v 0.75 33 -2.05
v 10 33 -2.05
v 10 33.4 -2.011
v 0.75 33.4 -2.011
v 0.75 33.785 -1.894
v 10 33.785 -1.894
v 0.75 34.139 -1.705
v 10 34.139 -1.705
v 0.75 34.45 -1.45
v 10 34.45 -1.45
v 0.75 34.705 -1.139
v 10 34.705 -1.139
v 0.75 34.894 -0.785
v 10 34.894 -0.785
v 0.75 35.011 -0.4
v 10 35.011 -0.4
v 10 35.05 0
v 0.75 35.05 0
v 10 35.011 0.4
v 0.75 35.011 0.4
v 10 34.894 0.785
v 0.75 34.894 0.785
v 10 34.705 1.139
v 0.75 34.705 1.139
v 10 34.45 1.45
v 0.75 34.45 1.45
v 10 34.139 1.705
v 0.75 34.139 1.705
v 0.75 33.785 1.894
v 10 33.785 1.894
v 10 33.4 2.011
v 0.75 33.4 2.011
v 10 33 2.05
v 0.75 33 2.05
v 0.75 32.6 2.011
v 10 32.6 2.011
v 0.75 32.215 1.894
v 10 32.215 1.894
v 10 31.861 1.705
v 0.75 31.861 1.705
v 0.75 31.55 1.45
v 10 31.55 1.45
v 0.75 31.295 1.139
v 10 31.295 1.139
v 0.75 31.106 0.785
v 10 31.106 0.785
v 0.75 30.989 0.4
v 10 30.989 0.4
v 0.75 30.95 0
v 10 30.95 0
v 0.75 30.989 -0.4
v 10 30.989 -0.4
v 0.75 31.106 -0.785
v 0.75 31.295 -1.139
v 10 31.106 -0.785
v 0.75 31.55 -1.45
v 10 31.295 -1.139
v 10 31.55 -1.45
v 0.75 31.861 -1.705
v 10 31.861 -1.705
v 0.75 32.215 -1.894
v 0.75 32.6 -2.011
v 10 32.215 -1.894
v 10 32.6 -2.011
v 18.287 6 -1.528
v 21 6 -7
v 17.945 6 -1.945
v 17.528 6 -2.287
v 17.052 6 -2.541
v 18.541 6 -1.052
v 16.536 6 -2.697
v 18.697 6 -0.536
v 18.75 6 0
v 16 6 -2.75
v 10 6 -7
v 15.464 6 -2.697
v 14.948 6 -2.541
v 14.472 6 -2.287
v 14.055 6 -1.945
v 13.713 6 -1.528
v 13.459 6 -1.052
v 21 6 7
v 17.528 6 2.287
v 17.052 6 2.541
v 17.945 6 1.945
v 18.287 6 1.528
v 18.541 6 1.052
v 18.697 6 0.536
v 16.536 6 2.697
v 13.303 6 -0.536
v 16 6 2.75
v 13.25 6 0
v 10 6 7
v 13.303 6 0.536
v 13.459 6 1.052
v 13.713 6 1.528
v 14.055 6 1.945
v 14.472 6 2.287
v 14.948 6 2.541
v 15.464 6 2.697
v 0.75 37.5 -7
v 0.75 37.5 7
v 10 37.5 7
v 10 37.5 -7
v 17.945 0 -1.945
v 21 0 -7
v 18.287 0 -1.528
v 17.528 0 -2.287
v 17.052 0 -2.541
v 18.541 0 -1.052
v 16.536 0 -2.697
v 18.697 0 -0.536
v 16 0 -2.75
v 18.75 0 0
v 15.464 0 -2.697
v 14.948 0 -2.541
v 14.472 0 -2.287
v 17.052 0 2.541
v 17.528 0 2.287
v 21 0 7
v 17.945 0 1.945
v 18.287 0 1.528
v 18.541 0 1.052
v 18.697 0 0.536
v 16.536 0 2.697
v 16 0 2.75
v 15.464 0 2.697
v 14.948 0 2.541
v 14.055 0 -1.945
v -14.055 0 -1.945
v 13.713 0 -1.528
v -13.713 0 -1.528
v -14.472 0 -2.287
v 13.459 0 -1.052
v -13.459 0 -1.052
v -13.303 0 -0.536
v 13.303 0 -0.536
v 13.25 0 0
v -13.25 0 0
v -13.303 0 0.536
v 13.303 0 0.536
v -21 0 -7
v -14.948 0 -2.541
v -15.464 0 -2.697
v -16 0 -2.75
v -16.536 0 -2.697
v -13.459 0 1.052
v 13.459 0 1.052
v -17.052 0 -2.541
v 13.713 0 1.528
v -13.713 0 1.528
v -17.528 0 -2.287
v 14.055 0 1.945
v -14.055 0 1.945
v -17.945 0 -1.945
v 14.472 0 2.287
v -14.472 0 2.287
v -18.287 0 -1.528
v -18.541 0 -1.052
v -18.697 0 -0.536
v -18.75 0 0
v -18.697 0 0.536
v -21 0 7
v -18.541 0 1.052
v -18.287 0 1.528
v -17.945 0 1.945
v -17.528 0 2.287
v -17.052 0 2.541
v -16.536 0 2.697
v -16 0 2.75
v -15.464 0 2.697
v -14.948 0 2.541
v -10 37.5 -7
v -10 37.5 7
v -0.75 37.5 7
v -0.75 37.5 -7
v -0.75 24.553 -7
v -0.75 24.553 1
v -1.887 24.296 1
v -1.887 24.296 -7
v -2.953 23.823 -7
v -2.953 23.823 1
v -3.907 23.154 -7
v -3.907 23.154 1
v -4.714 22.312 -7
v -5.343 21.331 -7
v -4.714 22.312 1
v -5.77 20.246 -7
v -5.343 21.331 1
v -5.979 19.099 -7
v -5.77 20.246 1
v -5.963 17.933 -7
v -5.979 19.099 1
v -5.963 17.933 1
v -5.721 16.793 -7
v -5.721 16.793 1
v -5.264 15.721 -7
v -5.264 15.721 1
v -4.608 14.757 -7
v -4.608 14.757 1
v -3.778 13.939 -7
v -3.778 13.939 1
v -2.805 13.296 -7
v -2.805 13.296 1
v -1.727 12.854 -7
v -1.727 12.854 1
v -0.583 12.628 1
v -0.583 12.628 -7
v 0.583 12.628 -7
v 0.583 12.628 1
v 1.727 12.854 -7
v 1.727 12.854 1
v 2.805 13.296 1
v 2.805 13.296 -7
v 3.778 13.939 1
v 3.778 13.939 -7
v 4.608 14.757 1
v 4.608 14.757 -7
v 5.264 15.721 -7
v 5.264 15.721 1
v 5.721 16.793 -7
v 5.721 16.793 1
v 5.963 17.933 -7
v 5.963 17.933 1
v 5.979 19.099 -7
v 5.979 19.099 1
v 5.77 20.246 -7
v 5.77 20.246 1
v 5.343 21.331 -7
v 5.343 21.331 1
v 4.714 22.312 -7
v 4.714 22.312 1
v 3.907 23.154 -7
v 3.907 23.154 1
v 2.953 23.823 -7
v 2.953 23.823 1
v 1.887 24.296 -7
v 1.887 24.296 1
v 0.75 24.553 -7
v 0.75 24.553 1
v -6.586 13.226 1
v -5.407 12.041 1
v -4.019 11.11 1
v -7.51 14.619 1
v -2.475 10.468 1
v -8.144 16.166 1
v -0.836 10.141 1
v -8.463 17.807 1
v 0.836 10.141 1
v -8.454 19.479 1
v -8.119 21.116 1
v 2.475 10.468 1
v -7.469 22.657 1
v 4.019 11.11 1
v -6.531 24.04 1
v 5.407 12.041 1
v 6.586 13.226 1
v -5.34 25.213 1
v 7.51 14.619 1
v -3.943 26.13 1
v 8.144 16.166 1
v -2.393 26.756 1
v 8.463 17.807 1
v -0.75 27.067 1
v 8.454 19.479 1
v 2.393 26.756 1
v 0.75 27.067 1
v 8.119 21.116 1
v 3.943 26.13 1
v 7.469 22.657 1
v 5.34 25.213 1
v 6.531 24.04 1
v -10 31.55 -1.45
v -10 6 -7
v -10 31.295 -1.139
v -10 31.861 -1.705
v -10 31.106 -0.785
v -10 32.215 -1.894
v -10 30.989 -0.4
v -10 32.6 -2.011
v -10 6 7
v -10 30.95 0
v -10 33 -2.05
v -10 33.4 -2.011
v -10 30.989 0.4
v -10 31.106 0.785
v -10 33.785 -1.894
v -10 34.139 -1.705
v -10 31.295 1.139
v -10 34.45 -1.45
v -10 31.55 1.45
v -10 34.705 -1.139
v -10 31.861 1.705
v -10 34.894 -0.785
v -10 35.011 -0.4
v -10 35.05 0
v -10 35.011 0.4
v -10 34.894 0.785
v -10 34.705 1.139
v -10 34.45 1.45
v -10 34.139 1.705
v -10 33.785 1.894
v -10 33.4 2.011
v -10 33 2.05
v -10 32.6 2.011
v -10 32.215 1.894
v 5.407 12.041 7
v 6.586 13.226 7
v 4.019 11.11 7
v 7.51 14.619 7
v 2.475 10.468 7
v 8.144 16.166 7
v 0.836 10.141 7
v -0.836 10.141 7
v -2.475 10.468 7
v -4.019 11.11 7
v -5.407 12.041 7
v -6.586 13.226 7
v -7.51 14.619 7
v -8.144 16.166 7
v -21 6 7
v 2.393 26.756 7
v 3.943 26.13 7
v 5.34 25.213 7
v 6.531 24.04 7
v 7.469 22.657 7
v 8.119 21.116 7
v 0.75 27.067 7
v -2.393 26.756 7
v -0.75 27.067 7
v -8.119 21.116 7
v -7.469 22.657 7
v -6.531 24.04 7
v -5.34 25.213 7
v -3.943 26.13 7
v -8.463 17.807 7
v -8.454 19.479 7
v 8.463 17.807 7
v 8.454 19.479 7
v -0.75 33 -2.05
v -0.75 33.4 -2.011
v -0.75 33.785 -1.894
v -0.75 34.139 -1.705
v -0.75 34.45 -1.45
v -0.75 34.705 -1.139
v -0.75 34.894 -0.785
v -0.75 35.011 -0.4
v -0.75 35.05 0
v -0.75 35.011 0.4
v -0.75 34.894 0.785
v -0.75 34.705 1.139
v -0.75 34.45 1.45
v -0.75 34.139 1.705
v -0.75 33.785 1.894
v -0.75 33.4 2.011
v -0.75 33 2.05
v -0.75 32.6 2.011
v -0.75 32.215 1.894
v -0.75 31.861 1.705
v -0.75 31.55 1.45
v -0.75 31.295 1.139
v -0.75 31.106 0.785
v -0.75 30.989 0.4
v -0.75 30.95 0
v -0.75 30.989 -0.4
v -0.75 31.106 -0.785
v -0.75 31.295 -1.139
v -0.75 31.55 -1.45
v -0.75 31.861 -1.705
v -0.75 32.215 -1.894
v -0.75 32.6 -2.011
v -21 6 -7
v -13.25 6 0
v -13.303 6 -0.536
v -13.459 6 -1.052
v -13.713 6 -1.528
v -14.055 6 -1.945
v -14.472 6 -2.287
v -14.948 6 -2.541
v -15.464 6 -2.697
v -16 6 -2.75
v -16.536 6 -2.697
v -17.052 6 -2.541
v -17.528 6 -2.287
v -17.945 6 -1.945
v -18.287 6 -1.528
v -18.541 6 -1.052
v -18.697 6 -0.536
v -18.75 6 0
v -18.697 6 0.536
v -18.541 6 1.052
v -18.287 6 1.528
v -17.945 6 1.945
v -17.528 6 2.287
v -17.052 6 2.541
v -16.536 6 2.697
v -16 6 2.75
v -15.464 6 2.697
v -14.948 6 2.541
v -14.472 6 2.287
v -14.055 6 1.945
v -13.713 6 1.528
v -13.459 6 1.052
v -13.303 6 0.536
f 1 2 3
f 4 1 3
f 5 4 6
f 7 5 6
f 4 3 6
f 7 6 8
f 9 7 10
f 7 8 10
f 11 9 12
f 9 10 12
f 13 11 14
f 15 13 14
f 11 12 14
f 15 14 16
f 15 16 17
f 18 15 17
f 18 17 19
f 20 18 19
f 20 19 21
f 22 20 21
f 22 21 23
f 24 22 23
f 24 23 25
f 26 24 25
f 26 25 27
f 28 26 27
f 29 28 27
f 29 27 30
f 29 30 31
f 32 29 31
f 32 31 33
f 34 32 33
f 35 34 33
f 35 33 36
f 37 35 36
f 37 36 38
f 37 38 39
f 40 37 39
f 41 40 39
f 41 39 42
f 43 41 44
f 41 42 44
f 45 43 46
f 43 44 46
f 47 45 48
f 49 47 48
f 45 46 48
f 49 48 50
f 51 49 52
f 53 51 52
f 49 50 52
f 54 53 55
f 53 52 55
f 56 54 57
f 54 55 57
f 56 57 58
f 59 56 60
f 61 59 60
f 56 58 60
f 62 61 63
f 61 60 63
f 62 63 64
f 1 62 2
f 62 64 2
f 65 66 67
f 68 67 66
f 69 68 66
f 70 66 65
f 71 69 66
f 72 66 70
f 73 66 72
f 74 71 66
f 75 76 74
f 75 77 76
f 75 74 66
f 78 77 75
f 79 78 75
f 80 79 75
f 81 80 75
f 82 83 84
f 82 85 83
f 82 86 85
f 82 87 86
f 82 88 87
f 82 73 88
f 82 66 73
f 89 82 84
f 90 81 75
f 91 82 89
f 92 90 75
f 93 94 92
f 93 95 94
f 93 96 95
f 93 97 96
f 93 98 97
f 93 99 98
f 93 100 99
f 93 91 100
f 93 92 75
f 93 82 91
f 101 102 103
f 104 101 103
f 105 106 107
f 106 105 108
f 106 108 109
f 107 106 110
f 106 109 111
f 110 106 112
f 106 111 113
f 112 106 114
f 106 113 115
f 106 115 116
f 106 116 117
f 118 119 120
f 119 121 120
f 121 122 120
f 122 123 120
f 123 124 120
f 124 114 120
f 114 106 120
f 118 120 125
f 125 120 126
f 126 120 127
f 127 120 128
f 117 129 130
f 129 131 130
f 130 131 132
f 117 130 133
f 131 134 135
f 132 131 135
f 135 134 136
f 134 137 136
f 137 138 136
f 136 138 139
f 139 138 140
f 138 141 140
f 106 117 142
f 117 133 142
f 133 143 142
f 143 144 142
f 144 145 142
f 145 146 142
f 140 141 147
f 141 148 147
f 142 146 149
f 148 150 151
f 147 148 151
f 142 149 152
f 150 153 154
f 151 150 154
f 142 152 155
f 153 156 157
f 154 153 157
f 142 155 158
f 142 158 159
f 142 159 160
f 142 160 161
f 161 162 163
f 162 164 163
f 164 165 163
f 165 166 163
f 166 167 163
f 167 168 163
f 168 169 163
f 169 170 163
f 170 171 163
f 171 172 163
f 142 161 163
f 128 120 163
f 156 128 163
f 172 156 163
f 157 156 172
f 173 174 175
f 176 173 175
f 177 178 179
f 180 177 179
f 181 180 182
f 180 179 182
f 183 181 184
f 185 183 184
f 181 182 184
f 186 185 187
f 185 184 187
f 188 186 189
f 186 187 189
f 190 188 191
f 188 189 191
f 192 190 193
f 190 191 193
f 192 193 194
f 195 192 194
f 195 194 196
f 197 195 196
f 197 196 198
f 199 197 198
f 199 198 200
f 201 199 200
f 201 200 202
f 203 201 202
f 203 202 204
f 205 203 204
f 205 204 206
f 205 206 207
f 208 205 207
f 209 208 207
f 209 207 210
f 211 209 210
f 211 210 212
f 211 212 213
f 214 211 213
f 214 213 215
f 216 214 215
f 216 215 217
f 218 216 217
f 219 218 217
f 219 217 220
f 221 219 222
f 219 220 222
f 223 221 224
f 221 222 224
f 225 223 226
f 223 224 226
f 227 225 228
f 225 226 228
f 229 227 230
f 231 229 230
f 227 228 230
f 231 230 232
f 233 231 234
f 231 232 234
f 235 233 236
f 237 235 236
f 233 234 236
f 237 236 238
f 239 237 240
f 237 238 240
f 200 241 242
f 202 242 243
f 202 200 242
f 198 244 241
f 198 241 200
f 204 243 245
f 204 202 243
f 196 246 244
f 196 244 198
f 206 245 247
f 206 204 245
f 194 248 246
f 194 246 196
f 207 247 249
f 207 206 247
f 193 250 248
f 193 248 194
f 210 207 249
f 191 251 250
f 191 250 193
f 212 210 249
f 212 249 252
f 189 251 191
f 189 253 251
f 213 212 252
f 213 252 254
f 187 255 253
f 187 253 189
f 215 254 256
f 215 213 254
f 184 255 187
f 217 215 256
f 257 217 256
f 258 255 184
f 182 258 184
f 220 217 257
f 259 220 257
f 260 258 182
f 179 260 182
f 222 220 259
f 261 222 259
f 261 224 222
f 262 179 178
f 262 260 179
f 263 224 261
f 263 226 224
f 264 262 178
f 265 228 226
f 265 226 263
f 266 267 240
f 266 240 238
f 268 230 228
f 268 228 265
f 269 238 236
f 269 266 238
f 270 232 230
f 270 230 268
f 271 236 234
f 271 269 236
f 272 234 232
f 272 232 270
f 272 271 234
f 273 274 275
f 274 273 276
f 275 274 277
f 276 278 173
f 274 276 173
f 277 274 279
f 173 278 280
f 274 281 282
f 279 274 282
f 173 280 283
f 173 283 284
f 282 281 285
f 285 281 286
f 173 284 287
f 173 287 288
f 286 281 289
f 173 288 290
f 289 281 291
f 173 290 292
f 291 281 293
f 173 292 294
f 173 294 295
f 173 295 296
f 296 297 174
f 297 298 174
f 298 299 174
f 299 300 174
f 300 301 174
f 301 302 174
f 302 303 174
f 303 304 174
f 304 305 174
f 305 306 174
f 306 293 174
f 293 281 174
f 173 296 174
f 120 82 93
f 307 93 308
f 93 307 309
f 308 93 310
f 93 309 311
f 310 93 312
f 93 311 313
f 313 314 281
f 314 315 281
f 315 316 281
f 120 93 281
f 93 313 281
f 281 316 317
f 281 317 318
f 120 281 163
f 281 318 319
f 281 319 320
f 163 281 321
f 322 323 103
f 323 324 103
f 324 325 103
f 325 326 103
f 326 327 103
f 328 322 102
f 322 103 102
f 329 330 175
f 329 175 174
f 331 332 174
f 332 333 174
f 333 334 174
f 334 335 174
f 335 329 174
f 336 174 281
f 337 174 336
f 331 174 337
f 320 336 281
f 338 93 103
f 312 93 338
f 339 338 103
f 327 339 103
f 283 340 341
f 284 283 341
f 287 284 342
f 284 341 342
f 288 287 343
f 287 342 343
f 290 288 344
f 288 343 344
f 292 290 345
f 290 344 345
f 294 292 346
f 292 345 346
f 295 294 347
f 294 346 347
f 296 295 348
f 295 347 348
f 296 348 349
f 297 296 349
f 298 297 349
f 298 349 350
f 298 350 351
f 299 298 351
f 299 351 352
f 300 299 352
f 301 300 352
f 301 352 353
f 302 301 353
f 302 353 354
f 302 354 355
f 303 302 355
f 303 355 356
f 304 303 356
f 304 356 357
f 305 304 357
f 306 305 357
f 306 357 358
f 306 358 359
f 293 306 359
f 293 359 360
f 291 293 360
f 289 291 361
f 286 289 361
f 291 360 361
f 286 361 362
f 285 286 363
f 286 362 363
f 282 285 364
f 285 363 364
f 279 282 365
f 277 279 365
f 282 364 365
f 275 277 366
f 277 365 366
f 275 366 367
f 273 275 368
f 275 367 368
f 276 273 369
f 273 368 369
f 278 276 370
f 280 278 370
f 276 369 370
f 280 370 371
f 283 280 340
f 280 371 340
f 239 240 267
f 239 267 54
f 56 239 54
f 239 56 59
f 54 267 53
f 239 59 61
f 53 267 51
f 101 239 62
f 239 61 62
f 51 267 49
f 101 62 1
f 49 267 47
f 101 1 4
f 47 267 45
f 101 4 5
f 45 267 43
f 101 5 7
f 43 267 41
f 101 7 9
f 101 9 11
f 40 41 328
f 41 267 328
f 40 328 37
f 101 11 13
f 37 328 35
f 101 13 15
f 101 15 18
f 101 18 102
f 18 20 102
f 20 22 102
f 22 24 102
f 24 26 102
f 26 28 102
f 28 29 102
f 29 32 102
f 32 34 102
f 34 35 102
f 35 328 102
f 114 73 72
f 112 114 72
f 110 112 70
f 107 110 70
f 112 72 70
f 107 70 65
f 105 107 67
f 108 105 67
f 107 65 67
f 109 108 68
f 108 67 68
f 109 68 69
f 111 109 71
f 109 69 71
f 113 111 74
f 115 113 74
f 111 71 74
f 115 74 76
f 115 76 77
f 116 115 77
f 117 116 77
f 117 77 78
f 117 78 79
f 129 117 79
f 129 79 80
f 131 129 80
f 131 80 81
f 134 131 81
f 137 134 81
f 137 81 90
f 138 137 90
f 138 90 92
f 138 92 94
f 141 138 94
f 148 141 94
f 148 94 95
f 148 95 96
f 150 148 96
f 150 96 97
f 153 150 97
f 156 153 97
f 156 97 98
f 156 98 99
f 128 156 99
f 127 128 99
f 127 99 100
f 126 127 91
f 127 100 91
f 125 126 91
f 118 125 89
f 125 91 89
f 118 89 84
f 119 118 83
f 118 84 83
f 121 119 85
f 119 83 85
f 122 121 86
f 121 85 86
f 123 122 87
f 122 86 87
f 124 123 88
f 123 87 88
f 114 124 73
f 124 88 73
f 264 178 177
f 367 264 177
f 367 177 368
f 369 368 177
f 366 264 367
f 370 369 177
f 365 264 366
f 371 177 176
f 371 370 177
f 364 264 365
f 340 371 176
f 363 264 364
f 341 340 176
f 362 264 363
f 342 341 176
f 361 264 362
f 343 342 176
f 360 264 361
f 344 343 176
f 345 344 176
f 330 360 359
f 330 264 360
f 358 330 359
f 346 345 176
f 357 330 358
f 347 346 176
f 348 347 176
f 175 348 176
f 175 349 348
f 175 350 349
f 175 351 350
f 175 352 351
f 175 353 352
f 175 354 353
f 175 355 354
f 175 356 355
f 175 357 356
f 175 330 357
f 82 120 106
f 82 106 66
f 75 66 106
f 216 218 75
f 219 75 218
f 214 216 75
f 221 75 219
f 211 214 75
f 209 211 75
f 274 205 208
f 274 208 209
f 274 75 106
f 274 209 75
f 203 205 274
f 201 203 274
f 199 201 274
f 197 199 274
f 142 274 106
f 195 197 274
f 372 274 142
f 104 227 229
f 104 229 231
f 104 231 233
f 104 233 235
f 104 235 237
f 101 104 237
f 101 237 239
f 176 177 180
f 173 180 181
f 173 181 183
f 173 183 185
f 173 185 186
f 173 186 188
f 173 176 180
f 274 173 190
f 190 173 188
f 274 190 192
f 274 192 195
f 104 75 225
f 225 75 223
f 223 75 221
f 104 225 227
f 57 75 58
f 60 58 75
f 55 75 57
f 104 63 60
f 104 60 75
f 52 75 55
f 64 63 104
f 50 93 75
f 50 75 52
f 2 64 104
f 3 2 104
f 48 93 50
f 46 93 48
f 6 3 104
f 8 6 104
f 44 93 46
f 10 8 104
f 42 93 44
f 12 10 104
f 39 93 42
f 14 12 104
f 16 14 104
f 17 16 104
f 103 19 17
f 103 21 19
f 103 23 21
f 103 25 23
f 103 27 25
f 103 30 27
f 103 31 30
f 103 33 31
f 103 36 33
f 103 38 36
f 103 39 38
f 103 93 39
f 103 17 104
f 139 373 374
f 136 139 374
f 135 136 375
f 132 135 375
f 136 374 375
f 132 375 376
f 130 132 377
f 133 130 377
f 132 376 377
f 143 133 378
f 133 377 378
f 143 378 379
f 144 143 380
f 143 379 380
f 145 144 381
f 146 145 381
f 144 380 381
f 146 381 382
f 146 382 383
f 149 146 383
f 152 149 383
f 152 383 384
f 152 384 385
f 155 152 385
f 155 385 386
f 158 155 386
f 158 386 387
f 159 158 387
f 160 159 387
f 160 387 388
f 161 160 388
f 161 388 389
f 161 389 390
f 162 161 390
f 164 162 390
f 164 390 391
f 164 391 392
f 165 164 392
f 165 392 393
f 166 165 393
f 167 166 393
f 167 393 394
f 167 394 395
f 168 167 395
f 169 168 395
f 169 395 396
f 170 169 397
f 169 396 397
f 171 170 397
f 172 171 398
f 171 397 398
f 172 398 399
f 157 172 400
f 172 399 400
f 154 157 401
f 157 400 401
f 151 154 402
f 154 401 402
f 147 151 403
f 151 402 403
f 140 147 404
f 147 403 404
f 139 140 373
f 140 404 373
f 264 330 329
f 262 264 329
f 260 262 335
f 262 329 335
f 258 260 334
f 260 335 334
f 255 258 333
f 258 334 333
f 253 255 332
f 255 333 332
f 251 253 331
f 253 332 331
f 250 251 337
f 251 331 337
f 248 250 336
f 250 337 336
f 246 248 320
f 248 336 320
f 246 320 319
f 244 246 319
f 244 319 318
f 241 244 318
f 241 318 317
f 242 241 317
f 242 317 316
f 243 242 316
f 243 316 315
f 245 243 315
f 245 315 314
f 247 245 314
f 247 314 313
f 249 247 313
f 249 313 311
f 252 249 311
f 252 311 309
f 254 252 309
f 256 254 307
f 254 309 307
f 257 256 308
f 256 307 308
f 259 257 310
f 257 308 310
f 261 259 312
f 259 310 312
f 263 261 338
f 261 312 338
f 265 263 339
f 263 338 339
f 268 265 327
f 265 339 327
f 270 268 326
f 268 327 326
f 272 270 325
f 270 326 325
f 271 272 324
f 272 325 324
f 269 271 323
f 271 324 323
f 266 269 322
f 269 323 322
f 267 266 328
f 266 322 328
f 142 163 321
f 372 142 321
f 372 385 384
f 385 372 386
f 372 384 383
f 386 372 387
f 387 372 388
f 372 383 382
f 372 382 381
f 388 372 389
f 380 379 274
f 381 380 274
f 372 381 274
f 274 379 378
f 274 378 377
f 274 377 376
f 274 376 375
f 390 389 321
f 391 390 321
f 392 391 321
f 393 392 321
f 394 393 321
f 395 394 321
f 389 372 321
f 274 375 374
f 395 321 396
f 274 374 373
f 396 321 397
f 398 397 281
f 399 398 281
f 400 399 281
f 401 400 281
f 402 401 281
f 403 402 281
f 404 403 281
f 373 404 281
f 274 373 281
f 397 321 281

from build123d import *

# Parameters (mm, degrees)
BOSS_EXTRUDE1_DEPTH = 7
SKETCH2_R           = 6
CUT_EXTRUDE1_DEPTH  = 15
SKETCH3_R           = 2.05
CUT_EXTRUDE2_DEPTH  = 32
SKETCH4_R           = 2.75
CUT_EXTRUDE3_DEPTH  = 14
SKETCH5_W           = 1.5
SKETCH5_H           = 29
CUT_EXTRUDE4_DEPTH  = 15
SKETCH6_R           = 8.5
CUT_EXTRUDE5_DEPTH  = 6


with BuildPart() as part:
    # Sketch1 → Boss-Extrude1 (new body, symmetric)
    with BuildSketch(Plane.XY):
        Polygon((0, 0), (21, 0), (21, 6), (10, 6), (10, 37.5), (0, 37.5), align=None)
    boss_extrude1 = extrude(amount=BOSS_EXTRUDE1_DEPTH, both=True)

    # Mirror1: Boss-Extrude1 across plane
    add(boss_extrude1.mirror(Plane(origin=(0, 37.5, 7), x_dir=(0, 0, 1), z_dir=(1, 0, 0))))

    # Sketch2 → Cut-Extrude1 (cut, through all)
    with BuildSketch(Plane.XY.offset(7)):
        with Locations((0, 18.6)):
            Circle(SKETCH2_R)
    extrude(amount=-CUT_EXTRUDE1_DEPTH, mode=Mode.SUBTRACT)

    # Sketch3 → Cut-Extrude2 (cut, through all)
    with BuildSketch(Plane(origin=(10, 0, 0), x_dir=(0, 0, -1), z_dir=(1, 0, 0))):
        with Locations((0, 33)):
            Circle(SKETCH3_R)
    extrude(amount=-CUT_EXTRUDE2_DEPTH, mode=Mode.SUBTRACT)

    # Sketch4 → Cut-Extrude3 (cut)
    with BuildSketch(Plane(origin=(0, 6, 0), x_dir=(1, 0, 0), z_dir=(0, 1, 0))):
        with Locations((-16, 0)):
            Circle(SKETCH4_R)
        with Locations((16, 0)):
            Circle(SKETCH4_R)
    extrude(amount=-CUT_EXTRUDE3_DEPTH, mode=Mode.SUBTRACT)

    # Sketch5 → Cut-Extrude4 (cut, through all)
    with BuildSketch(Plane.XY.offset(7)):
        with Locations((0, 37.5)):
            Rectangle(SKETCH5_W, SKETCH5_H)
    extrude(amount=-CUT_EXTRUDE4_DEPTH, mode=Mode.SUBTRACT)

    # Sketch6 → Cut-Extrude5 (cut)
    with BuildSketch(Plane.XY.offset(7)):
        with Locations((0, 18.6)):
            Circle(SKETCH6_R)
    extrude(amount=-CUT_EXTRUDE5_DEPTH, mode=Mode.SUBTRACT)


solid = part.part
